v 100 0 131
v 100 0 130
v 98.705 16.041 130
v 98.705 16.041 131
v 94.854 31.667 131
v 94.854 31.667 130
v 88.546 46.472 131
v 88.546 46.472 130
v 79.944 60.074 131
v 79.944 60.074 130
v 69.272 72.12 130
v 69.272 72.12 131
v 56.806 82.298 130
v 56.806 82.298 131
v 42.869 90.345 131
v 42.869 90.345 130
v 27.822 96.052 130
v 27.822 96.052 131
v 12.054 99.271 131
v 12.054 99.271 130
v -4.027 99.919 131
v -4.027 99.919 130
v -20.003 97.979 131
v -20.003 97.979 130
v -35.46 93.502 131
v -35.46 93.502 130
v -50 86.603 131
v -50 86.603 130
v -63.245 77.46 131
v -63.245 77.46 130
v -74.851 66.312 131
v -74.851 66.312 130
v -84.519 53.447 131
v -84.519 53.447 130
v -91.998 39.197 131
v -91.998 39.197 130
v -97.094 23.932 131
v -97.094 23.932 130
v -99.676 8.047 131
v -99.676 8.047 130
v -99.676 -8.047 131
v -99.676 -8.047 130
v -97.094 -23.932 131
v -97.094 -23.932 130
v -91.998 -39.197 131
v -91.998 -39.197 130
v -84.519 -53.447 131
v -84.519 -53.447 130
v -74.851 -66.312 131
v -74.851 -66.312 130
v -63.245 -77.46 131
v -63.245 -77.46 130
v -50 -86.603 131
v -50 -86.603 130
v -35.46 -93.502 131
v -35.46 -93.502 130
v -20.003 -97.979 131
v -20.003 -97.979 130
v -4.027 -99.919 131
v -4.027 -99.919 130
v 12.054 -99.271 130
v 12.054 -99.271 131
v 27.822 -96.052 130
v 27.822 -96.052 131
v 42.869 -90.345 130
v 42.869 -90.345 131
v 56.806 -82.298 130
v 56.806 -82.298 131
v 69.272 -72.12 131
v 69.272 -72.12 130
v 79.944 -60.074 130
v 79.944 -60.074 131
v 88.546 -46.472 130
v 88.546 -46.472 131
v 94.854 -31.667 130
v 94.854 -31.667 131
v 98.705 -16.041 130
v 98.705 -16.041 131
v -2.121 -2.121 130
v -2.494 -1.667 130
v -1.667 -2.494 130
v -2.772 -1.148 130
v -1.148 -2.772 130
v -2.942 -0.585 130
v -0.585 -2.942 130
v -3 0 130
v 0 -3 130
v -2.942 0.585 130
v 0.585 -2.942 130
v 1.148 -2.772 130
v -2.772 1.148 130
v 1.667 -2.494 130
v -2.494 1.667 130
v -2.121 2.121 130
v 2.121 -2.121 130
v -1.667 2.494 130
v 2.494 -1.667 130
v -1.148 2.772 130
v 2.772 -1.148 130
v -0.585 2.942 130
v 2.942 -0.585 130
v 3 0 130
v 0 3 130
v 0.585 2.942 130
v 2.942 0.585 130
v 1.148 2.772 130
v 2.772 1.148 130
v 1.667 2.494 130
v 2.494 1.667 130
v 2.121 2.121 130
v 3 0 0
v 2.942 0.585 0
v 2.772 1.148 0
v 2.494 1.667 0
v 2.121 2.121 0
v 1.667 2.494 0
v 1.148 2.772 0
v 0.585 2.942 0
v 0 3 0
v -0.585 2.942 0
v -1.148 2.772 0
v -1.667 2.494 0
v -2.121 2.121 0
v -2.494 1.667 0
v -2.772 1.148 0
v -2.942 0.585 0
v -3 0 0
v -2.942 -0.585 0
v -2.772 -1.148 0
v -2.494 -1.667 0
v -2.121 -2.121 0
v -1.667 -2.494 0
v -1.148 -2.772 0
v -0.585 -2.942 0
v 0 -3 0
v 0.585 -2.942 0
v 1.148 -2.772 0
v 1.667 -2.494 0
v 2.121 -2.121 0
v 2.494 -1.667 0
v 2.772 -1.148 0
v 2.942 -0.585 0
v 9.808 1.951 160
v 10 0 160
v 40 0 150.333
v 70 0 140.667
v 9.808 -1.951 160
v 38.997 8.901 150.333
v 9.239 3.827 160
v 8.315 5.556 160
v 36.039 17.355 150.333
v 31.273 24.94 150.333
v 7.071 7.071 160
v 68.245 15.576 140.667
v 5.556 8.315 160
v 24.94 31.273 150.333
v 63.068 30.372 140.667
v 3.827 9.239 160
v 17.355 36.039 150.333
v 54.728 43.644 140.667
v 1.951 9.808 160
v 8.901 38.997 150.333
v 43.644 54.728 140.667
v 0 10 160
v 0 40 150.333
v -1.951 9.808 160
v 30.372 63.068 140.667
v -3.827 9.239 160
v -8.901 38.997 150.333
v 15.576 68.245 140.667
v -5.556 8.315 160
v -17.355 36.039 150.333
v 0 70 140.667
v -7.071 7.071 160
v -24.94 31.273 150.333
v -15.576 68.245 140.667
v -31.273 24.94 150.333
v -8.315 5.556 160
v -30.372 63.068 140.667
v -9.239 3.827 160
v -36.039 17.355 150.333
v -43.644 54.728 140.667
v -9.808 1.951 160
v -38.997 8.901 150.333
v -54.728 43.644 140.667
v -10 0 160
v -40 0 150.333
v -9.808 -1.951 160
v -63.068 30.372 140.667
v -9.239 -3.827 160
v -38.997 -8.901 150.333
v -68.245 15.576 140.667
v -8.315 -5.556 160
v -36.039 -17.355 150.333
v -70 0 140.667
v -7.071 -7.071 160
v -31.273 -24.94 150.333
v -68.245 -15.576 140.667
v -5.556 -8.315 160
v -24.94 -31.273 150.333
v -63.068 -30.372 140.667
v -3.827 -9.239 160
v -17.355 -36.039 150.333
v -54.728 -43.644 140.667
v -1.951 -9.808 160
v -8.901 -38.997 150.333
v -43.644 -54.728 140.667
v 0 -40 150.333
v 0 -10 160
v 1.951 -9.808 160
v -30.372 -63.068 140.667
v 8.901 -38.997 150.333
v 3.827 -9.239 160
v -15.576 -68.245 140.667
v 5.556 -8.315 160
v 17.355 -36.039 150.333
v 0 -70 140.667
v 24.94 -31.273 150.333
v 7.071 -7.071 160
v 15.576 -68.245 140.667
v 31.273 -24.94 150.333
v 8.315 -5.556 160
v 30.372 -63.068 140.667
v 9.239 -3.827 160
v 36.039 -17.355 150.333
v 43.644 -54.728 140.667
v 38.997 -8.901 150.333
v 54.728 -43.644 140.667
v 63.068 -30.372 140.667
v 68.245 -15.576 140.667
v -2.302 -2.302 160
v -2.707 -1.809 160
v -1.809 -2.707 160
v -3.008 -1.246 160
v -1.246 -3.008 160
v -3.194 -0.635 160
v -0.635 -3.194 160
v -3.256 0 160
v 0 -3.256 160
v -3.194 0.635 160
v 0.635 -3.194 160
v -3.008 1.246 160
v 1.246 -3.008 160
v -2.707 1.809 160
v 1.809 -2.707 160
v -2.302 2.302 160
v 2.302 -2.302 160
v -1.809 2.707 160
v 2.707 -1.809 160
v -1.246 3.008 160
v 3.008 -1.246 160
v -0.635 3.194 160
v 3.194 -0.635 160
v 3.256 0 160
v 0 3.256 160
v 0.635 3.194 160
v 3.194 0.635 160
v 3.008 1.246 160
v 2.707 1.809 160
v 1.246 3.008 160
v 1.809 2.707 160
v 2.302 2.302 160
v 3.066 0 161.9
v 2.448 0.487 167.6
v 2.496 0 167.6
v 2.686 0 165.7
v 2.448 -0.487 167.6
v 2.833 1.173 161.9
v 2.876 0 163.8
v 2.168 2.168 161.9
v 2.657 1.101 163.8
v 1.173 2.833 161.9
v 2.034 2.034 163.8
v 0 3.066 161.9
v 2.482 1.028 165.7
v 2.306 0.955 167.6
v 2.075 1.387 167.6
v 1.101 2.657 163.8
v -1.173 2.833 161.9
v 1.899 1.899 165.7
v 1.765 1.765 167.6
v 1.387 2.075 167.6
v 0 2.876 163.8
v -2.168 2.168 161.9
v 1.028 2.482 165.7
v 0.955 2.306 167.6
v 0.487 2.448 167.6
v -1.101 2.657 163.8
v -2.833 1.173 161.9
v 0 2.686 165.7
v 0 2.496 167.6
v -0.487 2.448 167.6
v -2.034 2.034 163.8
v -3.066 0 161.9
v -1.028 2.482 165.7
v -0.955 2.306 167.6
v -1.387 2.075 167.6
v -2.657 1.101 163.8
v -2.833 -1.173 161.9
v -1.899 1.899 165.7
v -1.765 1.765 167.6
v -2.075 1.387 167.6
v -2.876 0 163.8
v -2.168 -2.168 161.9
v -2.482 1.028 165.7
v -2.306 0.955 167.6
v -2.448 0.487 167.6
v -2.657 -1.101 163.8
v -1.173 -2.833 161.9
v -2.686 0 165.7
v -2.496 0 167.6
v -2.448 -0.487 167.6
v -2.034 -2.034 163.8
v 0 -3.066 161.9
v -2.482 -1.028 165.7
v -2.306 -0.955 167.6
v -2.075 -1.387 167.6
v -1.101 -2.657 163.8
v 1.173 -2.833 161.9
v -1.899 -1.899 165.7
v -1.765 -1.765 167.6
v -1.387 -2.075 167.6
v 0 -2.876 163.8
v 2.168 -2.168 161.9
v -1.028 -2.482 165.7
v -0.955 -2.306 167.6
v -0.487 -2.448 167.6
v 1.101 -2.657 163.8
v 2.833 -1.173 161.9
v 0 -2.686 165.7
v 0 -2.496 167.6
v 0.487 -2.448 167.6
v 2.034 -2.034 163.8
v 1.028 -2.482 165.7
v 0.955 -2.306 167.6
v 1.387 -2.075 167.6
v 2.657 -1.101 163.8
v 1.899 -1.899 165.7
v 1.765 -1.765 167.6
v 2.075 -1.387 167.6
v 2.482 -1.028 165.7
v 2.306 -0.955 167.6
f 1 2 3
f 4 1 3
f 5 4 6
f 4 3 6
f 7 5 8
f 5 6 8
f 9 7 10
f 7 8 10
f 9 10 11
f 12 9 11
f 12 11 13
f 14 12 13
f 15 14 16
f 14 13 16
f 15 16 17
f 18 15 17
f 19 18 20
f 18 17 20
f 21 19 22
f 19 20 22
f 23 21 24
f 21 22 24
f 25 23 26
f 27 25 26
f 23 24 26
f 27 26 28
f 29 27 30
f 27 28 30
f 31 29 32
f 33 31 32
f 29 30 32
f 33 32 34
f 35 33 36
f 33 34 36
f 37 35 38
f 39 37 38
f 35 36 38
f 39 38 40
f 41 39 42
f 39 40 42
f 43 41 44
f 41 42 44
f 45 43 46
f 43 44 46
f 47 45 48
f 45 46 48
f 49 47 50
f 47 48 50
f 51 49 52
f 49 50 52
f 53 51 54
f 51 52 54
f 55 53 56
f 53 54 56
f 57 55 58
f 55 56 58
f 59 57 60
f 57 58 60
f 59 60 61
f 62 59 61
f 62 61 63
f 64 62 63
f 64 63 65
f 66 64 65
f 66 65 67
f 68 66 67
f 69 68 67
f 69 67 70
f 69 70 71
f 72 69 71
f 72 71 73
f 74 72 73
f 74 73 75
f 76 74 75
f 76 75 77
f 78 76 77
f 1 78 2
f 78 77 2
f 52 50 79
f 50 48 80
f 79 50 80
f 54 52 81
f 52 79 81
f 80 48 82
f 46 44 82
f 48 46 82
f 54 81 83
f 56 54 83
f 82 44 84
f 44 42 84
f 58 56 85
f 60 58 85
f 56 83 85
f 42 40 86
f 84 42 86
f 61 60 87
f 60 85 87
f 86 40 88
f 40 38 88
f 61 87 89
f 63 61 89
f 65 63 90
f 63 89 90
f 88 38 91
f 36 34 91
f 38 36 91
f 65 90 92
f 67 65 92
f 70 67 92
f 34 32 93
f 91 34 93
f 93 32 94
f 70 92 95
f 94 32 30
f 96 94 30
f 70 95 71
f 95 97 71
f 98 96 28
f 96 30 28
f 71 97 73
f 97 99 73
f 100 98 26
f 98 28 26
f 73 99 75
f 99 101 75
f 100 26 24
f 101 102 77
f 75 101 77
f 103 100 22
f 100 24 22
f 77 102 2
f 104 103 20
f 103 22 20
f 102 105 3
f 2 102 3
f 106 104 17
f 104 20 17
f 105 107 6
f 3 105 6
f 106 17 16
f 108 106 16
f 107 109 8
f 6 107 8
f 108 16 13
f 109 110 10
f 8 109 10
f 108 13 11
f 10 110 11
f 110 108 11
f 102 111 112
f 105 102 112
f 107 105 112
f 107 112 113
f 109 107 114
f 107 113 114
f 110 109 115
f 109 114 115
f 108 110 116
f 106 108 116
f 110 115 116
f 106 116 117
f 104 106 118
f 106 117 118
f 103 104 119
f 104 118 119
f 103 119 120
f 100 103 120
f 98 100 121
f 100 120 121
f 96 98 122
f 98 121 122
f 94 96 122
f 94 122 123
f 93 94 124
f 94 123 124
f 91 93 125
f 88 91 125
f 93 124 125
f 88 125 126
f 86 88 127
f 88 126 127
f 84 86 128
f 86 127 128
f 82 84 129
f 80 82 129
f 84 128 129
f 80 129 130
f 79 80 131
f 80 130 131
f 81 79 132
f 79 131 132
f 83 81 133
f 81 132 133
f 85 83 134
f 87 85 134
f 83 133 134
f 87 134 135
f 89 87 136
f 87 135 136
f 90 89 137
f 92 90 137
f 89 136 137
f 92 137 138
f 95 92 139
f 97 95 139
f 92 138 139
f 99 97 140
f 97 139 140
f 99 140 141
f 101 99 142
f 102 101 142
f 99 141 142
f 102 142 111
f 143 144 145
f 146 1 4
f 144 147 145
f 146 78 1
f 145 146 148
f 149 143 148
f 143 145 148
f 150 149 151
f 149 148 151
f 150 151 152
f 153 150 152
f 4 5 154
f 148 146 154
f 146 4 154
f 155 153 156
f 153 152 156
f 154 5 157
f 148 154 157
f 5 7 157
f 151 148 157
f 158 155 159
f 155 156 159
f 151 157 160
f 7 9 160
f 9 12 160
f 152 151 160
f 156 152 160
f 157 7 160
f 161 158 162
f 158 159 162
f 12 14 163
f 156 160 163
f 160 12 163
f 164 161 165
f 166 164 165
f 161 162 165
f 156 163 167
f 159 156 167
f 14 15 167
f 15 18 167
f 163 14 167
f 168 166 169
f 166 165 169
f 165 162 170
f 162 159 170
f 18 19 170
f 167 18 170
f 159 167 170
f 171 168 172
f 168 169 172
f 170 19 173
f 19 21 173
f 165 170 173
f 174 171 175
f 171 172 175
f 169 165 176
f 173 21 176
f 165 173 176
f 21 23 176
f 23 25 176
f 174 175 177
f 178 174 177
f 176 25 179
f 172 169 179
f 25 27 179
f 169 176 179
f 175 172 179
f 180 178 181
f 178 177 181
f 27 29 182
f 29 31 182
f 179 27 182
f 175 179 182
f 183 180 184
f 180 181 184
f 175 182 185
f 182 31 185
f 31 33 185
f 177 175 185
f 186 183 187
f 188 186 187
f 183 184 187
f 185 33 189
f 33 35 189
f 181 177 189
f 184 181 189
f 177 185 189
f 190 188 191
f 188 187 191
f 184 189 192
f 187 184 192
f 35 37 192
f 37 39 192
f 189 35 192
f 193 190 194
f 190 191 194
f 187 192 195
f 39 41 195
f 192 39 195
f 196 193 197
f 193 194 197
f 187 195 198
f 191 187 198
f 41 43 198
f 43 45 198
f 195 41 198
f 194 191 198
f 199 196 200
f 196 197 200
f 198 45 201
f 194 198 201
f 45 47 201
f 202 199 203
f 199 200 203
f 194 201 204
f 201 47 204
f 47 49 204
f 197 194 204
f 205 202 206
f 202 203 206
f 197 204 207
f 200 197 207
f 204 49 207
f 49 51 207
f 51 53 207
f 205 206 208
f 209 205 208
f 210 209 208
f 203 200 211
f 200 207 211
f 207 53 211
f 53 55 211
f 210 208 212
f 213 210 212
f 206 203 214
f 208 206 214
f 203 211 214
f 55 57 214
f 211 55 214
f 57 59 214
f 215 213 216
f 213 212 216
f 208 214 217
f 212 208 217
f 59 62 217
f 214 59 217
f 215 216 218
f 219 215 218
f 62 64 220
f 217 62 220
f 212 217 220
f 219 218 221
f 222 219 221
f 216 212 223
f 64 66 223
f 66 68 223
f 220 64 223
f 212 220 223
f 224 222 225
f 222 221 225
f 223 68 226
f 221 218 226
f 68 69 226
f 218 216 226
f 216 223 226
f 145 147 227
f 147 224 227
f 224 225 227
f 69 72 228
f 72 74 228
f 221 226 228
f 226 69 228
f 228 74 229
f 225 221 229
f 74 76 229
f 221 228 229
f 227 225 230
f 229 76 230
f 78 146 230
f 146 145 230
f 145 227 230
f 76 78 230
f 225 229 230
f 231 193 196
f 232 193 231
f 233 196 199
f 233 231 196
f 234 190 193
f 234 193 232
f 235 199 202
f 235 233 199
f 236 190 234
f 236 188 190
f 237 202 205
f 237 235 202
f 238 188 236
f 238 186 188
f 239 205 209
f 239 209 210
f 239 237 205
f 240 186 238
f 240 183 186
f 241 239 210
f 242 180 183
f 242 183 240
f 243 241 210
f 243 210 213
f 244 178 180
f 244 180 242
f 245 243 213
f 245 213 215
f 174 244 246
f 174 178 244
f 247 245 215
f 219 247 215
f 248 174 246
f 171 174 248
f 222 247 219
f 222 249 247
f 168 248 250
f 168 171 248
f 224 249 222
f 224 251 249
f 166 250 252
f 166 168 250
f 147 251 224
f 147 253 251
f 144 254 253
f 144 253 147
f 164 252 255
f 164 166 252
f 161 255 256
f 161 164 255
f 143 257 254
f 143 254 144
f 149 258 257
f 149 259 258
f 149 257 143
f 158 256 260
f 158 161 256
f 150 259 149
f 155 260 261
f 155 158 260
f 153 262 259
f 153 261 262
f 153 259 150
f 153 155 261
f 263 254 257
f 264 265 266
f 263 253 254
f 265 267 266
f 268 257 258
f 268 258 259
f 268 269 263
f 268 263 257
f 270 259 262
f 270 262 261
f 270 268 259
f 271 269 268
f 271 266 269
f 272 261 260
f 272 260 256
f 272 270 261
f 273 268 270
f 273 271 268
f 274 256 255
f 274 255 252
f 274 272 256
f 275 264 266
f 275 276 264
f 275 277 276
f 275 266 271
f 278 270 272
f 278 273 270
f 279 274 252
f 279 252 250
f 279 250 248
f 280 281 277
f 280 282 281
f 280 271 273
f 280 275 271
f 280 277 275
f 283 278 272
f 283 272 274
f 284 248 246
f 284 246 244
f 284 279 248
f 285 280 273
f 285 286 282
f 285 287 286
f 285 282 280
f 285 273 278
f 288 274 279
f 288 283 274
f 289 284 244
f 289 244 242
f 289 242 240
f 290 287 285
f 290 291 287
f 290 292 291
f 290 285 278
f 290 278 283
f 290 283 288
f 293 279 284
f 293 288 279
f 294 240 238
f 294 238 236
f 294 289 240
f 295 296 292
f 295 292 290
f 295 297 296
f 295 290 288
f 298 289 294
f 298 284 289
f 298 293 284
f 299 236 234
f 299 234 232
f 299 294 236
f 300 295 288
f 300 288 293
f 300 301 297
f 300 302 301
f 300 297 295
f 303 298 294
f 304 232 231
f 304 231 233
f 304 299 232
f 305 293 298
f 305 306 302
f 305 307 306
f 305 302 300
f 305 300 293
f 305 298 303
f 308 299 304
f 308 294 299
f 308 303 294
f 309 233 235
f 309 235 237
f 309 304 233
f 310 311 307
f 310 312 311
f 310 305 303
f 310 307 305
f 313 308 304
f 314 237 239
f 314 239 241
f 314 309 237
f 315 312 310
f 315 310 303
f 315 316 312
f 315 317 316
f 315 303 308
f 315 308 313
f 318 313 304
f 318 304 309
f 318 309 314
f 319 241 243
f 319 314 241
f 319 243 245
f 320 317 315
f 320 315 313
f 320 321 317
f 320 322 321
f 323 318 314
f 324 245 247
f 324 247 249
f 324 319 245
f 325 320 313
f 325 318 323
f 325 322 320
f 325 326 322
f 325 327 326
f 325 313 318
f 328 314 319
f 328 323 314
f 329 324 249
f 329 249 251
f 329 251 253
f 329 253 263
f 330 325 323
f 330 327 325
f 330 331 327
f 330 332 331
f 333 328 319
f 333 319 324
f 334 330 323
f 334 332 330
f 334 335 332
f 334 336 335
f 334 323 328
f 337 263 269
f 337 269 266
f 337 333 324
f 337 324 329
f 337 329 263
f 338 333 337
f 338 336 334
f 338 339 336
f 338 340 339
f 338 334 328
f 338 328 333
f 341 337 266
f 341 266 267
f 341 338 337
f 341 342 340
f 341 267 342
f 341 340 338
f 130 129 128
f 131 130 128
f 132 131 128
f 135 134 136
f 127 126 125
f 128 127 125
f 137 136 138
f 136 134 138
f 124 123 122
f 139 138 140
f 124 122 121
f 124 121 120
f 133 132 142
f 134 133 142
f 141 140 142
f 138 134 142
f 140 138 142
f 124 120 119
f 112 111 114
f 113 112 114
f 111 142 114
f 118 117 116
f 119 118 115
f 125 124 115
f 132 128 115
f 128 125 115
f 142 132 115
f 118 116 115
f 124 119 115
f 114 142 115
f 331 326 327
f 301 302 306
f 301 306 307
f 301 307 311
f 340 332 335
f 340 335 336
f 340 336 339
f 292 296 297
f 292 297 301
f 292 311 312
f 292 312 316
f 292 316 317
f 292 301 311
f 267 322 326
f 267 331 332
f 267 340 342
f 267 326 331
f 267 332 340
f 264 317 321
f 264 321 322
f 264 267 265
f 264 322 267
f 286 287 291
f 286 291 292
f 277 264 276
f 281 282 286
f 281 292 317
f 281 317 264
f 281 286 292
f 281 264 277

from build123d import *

# Parameters (mm, degrees)
F0_R     = 3
F1_DEPTH = 130
F2_R     = 100
F2_R_2   = 3
F3_DEPTH = 30
F4_SIZE2 = 29
F4_SIZE  = 90
F5_R     = 3.4961547094
F6_DEPTH = 7.6


# Not quite as in the source:
# - a fillet or chamfer that OpenCascade refuses, or shapes differently, is made with other operations: its cross-section is extruded or revolved along the edge and cut away or added


with BuildPart() as f1:
    # F0 (on Top) → F1 (new body)
    with BuildSketch(Plane.XY):
        Circle(F0_R)
    extrude(amount=F1_DEPTH)

    # F2 (on face) → F3 (join)
    with BuildSketch(Plane.XY.offset(130)):
        Circle(F2_R)
        Circle(F2_R_2, mode=Mode.SUBTRACT)
        Circle(F2_R_2)
    extrude(amount=F3_DEPTH)

    # F4
    f4_edges = [f1.edges().sort_by_distance(p)[0] for p in [
        (-100, 0, 160),
    ]]
    f4_side = f1.faces().sort_by_distance((0, 0, 160))[0]
    chamfer(f4_edges, length=F4_SIZE, length2=F4_SIZE2, reference=f4_side)

    # F5 (on face) → F6 (join)
    with BuildSketch(Plane.XY.offset(160)):
        Circle(F5_R)
    extrude(amount=F6_DEPTH)

    # F7: chamfer of 1 x 10 on 1 edges, made by hand


with BuildPart() as f7_tool2:
    # F7_s3 → F7_t4 (revolve)
    with BuildSketch(Plane.XZ):
        Polygon((3.4961547094, 157.6), (2.4961547094, 167.6), (3.4961547094, 167.6), align=None)
    revolve(axis=Axis((0, 0, 167.6), (0, 0, 1)))

    split(bisect_by=Plane.XY.offset(160), keep=Keep.TOP)


with BuildPart() as f1_1:
    add(f1.part)

    # F7_t1: cut F7_tool2
    add(f7_tool2.part, mode=Mode.SUBTRACT)


solid = f1_1.part
